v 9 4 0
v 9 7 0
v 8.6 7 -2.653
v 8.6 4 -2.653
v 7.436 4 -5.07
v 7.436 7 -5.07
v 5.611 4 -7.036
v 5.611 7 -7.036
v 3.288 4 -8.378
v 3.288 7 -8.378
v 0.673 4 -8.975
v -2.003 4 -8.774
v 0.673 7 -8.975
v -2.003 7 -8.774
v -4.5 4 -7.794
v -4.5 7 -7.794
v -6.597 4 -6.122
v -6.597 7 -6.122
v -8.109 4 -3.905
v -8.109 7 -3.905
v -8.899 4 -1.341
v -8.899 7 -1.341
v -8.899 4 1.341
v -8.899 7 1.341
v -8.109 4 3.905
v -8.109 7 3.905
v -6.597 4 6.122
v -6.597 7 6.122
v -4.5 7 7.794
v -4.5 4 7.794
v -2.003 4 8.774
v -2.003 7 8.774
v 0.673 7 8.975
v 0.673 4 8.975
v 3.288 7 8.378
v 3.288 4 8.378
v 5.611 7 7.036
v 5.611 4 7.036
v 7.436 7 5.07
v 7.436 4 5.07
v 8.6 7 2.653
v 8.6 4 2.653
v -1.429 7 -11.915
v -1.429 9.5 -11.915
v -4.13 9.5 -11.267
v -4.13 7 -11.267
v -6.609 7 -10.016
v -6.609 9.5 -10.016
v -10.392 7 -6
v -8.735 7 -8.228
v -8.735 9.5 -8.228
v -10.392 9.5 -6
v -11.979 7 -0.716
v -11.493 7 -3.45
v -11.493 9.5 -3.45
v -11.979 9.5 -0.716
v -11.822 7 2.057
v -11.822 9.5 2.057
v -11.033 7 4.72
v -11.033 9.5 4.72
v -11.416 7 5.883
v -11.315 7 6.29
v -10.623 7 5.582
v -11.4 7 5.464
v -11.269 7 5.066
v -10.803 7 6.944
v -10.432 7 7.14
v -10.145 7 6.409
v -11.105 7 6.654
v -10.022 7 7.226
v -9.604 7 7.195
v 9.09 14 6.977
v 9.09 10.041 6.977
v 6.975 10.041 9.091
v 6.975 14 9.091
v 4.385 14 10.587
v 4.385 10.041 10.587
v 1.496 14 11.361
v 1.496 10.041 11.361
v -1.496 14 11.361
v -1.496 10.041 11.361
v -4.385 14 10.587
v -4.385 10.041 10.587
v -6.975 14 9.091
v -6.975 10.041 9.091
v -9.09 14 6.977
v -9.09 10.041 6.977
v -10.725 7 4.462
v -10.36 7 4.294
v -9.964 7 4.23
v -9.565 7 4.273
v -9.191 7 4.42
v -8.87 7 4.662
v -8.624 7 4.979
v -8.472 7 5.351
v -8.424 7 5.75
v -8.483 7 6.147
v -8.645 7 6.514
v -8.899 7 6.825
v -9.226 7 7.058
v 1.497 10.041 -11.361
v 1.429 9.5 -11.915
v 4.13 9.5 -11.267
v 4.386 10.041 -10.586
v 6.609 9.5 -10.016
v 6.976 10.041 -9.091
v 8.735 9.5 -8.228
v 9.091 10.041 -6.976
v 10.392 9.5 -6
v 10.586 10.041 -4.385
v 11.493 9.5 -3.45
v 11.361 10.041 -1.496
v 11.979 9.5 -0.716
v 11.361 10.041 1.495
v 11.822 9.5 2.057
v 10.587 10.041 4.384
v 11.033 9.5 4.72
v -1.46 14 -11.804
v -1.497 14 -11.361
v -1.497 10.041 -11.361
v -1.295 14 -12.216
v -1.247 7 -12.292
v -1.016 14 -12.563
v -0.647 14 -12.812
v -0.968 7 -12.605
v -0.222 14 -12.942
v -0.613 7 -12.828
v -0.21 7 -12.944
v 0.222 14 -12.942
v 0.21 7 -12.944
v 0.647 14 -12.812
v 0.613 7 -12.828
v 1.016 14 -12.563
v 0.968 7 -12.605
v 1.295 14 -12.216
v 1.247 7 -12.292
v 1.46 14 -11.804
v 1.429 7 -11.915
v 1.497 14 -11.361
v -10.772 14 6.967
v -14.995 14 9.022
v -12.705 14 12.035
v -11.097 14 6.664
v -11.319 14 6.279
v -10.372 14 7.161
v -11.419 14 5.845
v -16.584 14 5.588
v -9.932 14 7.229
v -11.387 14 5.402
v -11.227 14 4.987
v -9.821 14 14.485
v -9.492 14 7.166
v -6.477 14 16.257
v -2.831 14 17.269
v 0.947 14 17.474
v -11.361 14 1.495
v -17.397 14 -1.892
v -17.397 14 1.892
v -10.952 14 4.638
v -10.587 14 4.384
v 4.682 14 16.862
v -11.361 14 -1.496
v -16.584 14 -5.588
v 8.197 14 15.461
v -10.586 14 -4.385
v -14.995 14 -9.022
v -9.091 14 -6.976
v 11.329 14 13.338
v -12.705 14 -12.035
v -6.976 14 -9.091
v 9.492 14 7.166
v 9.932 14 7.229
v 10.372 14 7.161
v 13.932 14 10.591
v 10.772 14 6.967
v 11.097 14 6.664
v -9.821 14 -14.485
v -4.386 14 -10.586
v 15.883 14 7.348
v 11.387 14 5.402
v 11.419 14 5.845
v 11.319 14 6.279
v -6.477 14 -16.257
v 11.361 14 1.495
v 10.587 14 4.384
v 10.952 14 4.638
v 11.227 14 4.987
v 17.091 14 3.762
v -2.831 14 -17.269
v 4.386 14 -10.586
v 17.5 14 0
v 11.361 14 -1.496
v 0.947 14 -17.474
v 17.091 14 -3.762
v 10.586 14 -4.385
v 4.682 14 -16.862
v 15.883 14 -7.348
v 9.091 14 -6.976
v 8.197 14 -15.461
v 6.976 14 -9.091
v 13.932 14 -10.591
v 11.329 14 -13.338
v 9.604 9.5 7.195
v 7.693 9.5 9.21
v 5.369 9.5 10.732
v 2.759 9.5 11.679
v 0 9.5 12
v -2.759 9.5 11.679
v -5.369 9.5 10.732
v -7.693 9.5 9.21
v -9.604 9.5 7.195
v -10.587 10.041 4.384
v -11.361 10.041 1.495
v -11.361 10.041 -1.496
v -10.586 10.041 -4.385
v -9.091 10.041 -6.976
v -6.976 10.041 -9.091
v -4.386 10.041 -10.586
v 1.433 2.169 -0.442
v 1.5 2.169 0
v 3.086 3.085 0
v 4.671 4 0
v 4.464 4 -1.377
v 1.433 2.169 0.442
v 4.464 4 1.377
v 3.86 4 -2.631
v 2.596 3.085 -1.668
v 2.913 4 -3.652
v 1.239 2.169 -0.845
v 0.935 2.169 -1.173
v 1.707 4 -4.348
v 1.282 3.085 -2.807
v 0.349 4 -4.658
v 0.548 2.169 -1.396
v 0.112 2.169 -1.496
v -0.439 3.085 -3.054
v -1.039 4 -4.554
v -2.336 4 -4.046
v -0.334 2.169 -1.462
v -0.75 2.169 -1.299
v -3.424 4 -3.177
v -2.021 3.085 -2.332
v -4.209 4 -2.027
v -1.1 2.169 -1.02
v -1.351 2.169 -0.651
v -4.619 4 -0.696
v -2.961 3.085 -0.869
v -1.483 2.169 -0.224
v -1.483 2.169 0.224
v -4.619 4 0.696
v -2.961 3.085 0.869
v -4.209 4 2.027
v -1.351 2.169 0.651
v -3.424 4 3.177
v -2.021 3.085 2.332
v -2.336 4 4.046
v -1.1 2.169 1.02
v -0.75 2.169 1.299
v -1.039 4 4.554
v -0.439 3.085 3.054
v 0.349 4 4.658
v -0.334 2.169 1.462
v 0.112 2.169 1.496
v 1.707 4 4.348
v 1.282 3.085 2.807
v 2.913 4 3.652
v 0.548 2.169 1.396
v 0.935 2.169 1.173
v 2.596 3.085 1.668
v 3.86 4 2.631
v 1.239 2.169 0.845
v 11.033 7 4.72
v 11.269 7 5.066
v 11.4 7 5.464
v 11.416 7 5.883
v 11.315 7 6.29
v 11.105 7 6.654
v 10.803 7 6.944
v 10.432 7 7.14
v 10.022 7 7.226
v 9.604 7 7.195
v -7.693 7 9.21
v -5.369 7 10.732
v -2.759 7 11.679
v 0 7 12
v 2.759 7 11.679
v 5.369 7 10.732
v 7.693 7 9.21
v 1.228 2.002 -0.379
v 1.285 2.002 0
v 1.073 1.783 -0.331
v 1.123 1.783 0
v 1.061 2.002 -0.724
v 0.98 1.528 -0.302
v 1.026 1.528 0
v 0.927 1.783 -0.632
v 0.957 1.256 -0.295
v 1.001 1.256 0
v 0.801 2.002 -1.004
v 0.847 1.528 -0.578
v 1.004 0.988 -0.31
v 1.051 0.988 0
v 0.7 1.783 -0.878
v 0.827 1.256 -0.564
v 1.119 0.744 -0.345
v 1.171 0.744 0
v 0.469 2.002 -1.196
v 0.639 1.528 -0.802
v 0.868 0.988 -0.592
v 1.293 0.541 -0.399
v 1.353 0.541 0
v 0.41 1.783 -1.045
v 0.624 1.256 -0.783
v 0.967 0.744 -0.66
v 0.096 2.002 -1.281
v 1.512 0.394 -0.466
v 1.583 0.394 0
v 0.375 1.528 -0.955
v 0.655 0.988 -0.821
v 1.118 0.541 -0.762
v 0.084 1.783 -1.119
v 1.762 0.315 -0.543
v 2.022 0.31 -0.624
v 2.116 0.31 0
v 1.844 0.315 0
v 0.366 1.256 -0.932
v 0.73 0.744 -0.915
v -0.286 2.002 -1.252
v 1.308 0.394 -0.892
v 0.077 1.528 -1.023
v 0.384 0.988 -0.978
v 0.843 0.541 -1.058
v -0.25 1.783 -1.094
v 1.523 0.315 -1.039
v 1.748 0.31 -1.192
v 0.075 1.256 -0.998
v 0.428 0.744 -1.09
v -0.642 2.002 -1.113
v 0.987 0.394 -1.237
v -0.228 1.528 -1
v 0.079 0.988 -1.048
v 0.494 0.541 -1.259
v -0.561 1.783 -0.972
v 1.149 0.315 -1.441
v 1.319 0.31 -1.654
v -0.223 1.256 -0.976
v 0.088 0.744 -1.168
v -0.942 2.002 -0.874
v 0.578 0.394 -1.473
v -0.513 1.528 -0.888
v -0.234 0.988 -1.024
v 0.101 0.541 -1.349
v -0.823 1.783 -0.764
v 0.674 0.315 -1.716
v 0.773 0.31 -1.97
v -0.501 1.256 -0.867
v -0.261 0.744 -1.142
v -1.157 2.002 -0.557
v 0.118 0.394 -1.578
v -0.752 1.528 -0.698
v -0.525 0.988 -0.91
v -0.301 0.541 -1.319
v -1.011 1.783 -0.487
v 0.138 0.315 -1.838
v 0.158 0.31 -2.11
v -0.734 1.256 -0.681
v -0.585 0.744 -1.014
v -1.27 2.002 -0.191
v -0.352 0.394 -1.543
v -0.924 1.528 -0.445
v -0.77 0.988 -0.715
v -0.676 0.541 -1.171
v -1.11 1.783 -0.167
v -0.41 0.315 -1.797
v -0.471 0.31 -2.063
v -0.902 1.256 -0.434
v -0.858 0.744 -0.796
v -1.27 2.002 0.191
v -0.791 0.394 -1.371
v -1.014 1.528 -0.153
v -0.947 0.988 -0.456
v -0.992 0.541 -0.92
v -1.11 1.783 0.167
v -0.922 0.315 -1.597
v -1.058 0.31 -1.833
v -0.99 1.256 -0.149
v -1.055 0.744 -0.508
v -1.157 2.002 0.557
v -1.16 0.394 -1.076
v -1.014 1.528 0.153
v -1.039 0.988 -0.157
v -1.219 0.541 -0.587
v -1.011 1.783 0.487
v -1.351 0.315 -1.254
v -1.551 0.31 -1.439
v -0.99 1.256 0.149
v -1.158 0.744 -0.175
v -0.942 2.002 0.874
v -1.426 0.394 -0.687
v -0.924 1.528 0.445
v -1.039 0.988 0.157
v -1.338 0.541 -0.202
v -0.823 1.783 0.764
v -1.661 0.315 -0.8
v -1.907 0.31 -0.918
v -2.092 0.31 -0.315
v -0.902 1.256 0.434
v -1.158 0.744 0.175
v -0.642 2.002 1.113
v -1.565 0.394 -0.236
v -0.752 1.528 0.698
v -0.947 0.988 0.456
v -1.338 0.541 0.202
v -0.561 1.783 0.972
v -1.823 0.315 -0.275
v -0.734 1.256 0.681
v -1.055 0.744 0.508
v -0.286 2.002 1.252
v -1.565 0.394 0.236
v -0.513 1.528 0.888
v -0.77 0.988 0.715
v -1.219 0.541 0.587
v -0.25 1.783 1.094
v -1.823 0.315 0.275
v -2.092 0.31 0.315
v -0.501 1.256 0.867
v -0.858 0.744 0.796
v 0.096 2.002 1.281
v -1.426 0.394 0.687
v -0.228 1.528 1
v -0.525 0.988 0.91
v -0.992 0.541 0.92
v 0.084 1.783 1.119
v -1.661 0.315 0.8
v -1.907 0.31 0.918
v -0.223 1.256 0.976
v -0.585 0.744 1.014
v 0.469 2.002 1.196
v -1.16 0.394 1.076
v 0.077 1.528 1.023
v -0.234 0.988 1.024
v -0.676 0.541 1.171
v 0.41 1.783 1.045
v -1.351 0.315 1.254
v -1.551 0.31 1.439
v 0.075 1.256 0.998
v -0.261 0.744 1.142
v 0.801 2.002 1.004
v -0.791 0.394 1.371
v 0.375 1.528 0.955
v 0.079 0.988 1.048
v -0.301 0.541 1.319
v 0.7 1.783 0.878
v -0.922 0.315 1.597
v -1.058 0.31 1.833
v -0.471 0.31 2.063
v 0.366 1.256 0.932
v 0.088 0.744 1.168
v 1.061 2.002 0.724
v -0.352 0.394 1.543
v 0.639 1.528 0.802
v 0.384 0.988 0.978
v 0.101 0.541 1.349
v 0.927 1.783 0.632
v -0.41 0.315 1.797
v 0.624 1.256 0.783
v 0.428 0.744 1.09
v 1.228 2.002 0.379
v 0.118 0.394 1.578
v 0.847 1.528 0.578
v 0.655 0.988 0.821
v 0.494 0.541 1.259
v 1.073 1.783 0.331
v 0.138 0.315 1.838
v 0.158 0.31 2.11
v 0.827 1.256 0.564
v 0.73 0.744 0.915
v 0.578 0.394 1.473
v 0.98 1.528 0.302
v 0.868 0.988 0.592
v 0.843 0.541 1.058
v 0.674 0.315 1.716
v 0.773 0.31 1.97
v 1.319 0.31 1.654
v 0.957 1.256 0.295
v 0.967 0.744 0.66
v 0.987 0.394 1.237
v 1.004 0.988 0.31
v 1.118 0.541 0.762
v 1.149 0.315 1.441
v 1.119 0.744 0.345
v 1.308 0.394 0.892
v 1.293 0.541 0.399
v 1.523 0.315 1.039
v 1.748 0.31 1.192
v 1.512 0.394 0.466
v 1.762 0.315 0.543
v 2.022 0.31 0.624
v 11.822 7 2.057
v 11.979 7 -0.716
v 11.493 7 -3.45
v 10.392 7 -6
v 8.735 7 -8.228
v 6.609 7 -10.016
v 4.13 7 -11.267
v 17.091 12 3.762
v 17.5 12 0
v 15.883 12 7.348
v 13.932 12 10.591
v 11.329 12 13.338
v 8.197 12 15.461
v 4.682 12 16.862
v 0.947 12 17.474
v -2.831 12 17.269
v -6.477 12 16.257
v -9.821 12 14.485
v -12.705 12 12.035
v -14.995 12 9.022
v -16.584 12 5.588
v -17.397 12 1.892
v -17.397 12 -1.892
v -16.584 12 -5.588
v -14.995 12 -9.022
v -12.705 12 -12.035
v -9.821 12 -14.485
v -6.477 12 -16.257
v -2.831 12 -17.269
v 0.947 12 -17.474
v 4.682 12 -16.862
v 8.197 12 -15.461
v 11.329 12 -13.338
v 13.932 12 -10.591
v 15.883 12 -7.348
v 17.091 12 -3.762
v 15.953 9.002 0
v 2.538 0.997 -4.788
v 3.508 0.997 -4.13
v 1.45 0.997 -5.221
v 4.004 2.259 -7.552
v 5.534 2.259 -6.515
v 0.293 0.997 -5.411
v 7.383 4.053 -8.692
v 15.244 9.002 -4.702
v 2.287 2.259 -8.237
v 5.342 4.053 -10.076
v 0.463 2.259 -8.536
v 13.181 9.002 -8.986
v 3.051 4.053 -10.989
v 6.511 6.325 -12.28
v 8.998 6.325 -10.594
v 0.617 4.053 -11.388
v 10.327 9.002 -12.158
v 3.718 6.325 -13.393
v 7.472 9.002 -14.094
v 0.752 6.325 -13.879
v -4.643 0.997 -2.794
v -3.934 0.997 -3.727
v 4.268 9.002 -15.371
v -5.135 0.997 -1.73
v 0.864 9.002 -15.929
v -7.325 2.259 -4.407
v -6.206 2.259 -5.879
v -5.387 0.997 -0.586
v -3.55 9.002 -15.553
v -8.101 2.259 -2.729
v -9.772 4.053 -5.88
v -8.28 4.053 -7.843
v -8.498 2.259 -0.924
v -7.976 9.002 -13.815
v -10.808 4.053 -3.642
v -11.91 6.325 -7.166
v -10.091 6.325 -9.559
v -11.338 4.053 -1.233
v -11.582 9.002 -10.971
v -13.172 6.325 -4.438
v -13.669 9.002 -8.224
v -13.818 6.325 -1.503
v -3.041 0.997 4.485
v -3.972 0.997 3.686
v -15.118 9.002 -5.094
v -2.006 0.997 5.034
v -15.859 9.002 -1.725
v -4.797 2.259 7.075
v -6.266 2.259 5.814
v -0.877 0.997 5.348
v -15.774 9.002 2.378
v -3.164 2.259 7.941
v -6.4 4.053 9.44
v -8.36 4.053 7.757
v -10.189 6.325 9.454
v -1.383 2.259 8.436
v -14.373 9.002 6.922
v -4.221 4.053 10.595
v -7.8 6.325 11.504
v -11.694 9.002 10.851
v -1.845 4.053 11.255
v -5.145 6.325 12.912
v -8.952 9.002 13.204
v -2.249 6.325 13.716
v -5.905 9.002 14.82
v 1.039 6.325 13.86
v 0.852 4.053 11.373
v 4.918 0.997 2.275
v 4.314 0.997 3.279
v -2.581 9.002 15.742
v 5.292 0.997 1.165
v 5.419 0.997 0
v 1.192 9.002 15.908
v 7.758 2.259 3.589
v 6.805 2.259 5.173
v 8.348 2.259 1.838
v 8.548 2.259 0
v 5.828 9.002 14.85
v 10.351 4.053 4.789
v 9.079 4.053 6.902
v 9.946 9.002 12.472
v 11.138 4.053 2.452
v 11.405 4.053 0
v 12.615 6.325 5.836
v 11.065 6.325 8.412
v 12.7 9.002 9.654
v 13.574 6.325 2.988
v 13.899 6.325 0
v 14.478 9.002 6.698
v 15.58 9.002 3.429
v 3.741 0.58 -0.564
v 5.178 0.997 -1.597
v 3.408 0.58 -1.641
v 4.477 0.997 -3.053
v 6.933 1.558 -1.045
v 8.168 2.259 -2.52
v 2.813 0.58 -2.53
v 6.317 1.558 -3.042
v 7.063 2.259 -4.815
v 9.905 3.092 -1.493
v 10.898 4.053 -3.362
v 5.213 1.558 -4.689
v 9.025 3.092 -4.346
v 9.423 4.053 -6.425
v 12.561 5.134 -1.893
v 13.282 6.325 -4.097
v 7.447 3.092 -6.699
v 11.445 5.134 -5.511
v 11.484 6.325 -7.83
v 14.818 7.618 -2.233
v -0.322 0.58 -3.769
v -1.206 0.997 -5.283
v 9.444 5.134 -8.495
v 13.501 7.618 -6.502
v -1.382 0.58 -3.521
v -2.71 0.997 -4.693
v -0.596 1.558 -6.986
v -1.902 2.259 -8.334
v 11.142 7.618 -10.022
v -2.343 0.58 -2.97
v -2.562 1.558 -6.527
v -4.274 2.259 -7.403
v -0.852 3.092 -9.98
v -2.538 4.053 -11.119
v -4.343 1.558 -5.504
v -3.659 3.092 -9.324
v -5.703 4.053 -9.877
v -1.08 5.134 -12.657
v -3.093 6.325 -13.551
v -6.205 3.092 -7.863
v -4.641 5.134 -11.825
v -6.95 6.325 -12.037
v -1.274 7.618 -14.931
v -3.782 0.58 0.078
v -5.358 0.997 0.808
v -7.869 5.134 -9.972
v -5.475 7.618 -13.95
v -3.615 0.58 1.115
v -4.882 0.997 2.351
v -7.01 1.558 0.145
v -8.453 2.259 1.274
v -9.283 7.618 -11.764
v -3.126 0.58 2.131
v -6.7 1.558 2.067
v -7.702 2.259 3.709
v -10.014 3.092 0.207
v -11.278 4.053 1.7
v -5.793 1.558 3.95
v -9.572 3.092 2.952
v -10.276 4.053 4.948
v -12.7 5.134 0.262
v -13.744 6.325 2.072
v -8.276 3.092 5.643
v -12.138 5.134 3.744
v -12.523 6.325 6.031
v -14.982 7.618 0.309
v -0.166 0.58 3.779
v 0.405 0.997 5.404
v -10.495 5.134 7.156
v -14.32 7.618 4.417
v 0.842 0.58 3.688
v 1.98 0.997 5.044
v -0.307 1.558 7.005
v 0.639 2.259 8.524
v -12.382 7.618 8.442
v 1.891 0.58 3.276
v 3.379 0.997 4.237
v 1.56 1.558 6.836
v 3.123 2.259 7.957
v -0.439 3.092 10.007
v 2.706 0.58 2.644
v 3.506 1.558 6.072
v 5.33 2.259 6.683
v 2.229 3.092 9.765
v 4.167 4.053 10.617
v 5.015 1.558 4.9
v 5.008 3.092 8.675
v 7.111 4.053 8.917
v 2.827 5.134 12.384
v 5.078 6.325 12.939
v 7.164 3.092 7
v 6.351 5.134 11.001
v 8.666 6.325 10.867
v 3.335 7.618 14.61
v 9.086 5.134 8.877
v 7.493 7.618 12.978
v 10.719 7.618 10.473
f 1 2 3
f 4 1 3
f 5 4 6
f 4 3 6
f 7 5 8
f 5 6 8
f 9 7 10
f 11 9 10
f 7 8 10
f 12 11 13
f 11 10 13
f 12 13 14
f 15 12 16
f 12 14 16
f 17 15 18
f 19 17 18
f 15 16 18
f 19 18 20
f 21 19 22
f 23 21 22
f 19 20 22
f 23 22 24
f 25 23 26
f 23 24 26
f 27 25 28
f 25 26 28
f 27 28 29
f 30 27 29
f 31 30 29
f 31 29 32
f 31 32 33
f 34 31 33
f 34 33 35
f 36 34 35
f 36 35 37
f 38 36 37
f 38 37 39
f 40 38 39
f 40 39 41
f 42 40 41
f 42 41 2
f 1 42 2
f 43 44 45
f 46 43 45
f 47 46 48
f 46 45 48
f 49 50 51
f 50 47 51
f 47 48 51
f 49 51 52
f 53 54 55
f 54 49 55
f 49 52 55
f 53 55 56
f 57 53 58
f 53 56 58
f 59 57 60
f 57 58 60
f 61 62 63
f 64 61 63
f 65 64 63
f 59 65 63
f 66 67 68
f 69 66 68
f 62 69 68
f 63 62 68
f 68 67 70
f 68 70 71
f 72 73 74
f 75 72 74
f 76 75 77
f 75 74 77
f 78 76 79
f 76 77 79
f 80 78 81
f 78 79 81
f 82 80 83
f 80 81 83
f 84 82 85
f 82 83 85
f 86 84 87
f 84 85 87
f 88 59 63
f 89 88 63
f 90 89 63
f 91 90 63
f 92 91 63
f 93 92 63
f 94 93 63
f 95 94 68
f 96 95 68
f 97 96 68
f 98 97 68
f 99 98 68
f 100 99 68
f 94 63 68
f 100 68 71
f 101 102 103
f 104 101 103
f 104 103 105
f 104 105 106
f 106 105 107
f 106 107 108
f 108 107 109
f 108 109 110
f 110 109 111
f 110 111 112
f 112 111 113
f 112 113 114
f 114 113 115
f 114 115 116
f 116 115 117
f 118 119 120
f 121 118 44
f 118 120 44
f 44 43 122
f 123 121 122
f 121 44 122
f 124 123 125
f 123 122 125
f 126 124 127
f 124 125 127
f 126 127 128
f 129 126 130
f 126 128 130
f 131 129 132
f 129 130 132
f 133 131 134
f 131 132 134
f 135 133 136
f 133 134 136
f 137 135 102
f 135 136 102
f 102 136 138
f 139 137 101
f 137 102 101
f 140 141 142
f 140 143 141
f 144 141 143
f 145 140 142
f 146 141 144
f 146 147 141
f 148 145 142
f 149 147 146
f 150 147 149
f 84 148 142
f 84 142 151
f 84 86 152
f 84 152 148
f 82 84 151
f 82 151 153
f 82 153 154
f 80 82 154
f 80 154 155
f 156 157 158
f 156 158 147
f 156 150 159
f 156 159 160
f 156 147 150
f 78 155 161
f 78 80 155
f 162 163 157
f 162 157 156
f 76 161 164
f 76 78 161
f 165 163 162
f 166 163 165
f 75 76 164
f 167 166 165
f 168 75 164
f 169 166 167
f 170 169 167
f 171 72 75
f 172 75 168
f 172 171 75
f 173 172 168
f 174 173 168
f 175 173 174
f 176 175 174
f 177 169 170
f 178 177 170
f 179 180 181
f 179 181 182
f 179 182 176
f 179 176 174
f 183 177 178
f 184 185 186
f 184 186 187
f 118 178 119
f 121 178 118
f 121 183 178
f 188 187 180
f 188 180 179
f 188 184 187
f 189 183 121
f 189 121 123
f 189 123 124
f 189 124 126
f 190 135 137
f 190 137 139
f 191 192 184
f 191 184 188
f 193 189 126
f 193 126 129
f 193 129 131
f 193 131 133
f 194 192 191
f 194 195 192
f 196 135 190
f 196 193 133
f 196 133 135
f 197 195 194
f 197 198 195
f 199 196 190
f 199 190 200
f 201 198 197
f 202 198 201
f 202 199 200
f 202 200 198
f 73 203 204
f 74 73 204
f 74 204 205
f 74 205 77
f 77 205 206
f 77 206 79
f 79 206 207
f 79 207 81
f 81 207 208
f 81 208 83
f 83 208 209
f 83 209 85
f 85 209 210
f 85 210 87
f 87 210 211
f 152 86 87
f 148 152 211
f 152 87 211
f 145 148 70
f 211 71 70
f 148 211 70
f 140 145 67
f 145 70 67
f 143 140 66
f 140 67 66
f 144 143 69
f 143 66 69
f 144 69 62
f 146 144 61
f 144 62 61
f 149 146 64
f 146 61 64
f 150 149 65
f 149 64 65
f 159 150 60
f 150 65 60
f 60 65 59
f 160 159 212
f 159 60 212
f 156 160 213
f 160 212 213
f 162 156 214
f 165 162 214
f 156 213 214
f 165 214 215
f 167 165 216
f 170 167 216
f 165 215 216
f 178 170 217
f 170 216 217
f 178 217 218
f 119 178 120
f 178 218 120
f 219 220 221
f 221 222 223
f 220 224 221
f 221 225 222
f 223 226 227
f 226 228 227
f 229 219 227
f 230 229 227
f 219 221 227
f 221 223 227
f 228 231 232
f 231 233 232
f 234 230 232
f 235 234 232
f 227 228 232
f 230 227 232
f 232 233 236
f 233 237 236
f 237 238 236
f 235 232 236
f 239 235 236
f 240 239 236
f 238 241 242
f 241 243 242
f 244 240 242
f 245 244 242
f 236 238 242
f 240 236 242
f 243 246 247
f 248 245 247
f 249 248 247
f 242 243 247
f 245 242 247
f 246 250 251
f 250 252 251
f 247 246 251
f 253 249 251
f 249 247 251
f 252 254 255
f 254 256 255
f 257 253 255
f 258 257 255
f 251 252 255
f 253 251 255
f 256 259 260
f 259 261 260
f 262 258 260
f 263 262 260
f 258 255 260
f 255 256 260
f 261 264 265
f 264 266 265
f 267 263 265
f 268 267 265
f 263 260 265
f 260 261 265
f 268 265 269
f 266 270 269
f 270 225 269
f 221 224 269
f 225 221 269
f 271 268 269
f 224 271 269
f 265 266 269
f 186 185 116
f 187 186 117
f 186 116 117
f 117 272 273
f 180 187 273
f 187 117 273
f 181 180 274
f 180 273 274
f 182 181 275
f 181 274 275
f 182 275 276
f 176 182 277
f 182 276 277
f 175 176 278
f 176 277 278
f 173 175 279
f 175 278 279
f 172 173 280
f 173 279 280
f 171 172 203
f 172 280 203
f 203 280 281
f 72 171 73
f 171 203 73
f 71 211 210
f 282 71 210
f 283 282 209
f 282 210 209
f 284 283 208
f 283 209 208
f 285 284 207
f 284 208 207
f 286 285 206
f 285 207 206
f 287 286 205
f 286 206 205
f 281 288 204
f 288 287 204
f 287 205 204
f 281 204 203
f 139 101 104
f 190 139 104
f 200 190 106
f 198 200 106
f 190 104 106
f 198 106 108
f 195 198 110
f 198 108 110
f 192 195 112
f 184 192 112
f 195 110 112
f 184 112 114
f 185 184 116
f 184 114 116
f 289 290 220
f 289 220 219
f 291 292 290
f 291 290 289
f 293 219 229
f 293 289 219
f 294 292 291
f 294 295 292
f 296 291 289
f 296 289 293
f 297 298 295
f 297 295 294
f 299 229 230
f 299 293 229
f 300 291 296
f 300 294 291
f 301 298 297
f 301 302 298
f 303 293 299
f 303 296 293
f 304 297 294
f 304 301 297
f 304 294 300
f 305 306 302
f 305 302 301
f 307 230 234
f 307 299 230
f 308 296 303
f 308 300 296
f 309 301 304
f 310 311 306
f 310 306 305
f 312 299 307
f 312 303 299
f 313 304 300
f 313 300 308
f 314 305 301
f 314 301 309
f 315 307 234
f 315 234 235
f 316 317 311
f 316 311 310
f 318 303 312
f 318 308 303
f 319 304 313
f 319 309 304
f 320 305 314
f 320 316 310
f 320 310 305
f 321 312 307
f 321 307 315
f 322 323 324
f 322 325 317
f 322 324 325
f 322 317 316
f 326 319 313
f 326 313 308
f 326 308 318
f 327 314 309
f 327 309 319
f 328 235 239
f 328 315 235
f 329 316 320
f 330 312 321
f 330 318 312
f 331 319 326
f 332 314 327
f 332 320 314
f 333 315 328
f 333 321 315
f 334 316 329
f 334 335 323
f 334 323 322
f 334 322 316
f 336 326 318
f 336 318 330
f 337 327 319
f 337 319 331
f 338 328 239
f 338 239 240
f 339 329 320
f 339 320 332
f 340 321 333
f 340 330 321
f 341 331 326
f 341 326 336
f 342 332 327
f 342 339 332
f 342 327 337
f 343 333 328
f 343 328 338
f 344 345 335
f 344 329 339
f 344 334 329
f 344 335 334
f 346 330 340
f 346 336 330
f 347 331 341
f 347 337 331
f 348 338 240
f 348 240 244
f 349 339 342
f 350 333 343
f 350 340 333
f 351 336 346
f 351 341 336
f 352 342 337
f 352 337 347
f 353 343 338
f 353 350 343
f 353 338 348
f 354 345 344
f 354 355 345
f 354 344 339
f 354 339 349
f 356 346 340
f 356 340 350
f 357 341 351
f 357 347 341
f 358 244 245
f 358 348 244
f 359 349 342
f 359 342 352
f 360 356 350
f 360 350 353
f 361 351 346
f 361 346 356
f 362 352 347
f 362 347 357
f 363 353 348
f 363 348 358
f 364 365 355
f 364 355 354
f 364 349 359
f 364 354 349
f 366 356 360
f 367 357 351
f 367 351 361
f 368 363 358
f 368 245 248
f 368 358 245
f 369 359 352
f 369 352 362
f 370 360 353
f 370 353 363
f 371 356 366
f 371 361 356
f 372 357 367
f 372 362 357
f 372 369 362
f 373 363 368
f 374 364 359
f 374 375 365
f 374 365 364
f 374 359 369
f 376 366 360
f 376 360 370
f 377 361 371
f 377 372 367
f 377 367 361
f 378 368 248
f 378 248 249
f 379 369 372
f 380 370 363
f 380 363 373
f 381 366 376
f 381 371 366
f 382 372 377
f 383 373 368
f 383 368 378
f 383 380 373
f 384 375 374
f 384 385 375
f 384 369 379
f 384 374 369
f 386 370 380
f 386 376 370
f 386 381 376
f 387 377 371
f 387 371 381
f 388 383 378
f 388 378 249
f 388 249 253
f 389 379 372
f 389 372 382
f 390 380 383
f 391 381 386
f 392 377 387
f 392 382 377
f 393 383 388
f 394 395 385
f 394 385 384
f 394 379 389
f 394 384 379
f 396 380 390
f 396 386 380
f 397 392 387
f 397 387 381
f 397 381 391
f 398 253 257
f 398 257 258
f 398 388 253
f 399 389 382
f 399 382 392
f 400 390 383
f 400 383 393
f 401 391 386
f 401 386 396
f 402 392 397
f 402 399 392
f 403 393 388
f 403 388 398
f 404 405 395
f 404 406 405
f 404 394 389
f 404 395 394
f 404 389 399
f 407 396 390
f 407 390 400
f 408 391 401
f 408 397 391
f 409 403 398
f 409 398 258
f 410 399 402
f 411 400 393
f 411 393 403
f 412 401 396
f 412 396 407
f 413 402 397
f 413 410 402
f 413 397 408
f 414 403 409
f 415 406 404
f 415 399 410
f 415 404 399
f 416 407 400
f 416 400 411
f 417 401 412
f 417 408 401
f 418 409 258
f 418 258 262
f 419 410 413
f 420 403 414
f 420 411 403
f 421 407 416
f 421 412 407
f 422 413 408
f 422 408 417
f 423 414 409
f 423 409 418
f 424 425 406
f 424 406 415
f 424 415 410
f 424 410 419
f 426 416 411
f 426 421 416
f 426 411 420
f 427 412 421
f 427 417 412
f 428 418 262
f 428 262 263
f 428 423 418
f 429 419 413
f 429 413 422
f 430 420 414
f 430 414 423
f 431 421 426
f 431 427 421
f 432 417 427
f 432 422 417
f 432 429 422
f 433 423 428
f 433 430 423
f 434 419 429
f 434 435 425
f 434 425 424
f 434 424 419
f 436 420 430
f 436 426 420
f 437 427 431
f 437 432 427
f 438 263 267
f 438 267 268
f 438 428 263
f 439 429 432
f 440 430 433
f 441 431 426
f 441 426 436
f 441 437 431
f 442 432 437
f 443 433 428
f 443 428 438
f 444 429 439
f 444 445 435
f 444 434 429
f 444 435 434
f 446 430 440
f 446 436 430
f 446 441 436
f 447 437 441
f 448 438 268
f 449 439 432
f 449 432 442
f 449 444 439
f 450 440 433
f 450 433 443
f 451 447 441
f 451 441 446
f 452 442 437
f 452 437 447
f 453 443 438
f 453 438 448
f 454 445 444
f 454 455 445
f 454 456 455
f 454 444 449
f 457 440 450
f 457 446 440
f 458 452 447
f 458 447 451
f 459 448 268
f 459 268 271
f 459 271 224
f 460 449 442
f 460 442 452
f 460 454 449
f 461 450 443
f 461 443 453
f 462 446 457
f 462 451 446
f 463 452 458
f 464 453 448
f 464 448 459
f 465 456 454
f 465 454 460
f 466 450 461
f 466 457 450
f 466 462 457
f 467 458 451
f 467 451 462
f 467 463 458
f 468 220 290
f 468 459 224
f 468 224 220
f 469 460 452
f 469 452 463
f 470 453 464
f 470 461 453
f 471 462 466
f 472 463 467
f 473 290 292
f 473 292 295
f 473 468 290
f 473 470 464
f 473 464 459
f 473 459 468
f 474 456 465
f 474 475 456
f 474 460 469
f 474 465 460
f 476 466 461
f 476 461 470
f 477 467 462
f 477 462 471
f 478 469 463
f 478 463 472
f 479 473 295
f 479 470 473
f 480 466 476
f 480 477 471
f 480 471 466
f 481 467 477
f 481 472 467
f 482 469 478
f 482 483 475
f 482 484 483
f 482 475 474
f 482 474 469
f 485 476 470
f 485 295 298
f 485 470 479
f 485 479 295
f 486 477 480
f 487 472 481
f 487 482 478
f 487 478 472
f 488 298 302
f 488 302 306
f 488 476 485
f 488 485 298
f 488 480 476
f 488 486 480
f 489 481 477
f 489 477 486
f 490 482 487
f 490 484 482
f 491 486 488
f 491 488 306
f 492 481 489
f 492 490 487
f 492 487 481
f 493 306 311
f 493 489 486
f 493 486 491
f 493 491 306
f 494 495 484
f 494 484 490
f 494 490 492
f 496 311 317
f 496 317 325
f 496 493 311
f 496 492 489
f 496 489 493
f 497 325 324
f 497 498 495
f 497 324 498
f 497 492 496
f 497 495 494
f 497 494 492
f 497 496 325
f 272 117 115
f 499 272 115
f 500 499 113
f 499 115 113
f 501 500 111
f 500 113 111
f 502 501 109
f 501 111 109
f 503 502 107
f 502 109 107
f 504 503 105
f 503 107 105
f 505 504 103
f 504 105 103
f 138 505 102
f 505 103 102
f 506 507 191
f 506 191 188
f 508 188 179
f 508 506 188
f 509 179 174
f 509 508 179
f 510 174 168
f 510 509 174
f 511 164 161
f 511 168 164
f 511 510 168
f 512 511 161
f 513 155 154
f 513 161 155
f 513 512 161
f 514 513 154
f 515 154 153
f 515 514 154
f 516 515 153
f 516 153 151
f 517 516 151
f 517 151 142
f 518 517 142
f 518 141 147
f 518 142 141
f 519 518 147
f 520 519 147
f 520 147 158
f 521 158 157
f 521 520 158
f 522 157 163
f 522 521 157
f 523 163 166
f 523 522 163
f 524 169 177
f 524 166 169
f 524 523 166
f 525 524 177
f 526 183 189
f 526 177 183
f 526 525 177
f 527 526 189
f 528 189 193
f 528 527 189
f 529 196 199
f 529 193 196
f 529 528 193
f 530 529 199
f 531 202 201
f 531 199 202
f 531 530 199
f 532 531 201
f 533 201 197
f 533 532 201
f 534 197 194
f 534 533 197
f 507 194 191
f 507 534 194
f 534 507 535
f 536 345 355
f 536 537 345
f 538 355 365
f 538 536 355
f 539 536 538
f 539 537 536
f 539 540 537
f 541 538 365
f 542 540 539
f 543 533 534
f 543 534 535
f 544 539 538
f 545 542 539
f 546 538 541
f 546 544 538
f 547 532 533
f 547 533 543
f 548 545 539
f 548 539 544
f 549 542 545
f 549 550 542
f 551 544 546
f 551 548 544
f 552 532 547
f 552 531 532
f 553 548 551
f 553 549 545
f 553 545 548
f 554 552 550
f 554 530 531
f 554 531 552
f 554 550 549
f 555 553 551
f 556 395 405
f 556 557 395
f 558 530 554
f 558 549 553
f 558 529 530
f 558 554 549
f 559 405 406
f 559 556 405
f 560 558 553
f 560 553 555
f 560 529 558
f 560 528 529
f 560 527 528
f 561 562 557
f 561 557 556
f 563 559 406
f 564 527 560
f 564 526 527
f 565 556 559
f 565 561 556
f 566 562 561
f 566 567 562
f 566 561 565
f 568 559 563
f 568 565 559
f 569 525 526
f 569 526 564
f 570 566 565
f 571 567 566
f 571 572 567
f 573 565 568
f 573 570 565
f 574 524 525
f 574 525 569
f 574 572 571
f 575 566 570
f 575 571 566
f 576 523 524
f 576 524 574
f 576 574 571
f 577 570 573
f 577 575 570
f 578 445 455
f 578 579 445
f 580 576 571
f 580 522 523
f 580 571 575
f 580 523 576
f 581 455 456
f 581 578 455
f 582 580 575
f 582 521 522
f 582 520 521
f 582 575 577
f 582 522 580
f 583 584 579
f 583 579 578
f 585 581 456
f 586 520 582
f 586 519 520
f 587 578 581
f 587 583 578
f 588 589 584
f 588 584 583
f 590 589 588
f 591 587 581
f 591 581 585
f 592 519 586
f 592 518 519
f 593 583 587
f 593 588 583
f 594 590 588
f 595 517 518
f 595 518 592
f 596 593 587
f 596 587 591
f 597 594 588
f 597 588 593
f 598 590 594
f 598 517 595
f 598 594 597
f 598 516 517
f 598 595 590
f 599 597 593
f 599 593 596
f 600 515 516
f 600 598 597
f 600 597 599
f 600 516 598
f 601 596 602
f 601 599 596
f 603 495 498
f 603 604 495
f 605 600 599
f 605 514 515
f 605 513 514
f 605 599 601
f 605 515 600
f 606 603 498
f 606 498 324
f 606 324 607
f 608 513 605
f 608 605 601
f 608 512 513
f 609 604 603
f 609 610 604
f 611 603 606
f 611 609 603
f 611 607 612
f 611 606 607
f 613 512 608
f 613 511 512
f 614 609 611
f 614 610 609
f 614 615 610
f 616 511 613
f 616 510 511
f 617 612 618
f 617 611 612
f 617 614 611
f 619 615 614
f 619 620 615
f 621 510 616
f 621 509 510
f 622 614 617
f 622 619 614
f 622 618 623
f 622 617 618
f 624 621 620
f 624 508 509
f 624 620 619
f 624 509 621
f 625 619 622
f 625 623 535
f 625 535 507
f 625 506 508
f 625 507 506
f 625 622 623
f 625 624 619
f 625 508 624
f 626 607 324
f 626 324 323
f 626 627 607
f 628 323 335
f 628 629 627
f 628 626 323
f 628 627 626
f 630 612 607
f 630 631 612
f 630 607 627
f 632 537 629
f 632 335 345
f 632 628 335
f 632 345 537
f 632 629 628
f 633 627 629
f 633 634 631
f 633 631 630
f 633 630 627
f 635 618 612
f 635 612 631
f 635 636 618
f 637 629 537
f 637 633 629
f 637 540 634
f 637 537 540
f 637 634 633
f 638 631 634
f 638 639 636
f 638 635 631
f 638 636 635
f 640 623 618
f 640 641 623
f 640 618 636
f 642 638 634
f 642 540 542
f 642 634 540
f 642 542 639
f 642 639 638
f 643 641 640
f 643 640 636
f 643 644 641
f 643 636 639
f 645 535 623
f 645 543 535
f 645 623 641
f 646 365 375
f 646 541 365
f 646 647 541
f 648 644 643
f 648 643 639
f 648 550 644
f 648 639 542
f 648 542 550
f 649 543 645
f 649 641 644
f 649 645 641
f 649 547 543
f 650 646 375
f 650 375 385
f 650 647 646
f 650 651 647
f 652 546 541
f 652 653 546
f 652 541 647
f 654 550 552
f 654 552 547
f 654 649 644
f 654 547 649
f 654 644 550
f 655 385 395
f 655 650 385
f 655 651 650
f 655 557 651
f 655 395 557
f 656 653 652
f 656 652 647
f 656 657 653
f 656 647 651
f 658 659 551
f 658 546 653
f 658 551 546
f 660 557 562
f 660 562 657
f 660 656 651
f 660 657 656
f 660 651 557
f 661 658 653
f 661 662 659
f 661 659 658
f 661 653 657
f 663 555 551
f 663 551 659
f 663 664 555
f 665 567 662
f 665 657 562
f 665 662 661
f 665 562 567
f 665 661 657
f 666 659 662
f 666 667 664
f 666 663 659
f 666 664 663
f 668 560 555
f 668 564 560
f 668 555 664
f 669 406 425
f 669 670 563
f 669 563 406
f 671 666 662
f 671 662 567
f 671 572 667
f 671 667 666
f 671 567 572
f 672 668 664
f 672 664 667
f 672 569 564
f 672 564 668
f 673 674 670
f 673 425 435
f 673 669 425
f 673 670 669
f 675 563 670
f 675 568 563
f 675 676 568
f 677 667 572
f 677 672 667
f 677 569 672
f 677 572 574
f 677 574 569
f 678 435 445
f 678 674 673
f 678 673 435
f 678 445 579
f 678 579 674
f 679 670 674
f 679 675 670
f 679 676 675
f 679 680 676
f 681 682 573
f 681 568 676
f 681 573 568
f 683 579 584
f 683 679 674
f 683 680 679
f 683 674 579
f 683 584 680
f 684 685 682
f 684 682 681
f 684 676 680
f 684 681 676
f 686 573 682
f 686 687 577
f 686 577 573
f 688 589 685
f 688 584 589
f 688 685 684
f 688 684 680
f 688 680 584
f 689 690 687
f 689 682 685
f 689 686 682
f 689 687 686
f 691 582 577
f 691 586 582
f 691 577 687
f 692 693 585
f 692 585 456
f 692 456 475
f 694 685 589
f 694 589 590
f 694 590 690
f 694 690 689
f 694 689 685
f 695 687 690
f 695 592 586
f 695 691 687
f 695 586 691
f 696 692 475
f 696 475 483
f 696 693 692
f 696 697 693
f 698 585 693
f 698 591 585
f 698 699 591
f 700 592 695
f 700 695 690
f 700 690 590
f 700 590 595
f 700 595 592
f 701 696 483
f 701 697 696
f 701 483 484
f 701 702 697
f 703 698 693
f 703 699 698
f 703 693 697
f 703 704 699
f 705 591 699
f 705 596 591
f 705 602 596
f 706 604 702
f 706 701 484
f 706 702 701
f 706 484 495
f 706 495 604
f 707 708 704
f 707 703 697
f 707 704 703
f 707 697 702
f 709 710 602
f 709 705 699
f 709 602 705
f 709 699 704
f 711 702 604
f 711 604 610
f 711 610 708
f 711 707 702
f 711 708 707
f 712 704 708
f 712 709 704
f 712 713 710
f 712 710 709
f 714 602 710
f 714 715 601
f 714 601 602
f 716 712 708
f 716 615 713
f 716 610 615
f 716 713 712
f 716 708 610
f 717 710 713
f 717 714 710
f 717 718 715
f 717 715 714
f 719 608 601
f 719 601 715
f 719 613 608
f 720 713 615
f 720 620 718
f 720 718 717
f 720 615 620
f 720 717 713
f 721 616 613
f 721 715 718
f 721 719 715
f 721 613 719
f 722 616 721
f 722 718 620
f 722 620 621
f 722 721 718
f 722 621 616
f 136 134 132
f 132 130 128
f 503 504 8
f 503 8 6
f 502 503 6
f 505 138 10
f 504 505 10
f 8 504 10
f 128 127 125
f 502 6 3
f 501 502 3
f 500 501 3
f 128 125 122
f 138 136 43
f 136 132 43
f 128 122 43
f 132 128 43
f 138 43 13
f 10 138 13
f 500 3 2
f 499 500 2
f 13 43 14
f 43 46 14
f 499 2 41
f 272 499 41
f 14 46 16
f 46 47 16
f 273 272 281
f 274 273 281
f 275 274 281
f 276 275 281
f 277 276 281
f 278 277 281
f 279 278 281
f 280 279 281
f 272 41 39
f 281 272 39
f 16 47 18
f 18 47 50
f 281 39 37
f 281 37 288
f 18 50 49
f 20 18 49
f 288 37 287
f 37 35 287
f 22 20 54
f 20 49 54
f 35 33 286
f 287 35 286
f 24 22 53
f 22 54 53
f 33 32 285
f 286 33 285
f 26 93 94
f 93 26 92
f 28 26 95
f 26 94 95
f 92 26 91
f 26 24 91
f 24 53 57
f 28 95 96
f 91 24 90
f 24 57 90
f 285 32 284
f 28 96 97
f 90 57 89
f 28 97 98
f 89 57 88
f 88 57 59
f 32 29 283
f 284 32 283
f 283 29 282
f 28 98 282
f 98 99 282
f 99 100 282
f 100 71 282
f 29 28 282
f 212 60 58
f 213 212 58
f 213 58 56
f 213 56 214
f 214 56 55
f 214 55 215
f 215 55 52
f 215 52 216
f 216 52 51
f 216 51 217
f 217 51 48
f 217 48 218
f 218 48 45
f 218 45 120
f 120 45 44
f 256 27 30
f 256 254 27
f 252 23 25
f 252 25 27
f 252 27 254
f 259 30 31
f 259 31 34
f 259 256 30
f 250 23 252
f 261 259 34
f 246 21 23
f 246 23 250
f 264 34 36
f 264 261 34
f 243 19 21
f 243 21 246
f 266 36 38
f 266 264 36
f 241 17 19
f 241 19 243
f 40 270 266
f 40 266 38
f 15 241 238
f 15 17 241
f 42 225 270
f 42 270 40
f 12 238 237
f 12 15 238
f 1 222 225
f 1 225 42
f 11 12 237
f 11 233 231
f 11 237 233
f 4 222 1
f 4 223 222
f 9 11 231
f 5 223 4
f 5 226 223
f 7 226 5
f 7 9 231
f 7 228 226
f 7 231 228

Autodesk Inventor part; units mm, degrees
ref_plane "YZ Plane" through (0, 0, 0) normal (1, 0, 0) x (0, 1, 0)
ref_plane "XZ Plane" through (0, 0, 0) normal (0, 1, 0) x (-1, 0, 0)
ref_plane "XY Plane" through (0, 0, 0) normal (0, 0, 1) x (1, 0, 0)
sketch "Sketch1" plane through (0, 0, 0) normal (0, 0, 1) x (1, 0, 0)
  line L0 (-35.8694, 36.1667) -> (26.1213, 35.095) construction
  line L1 (26.1213, 35.095) -> (24.9917, -30.2436) construction
  line L2 (24.9917, -30.2436) -> (-36.999, -29.1719) construction
  line L3 (-36.999, -29.1719) -> (-35.8694, 36.1667) construction
  line L4 (0, -29.8115) -> (0, 35.5466) construction
  line L5 (-17.5, 14) -> (17.5, 14)
  line L6 (17.5, 14) -> (17.5, 12)
  arc A0 (0, 0.1813) -> (17.5, 12) centre (-0.0907, 19.1811) ccw
  arc A1 (1.5, 2.169) -> (2.1161, 0.3097) centre (2, 1.3029) ccw
  line L7 (12, 7) -> (12, 9.5)
  line L8 (12, 9.5) -> (11, 10.5)
  line L9 (11, 10.5) -> (11, 14)
  line L10 (4.6714, 4) -> (9, 4)
  line L11 (9, 4) -> (9, 7)
  line L12 (9, 7) -> (12, 7)
  line L13 (1.5, 2.169) -> (4.6714, 4)
  line L14 (1.5, 2.169) -> (0, 1.3029)
  point P0 (0, 0)
  point P1 (0, 14)
  point P2 (0, 0)
  dimension "d3" = 26.1213
  dimension "d7" = 24.9955
  dimension "d9" = 35
  dimension "d10" = 62
  dimension "d18" = 21.5466
  dimension "d19" = 14
  dimension "d26" = 19
  dimension "d27" = 1
  dimension "d34" = 22
  dimension "d38" = 135
  dimension "d39" = 2
  dimension "d41" = 2
  dimension "d44" = 24
  dimension "d54" = 11.831
  dimension "d82" = 18
  dimension "d83" = 10
  dimension "d86" = 7
  dimension "d87" = 3.5
  dimension "d90" = 150
revolve "Revolution1" add sketch "Sketch1" angle 360 about axis through (0, -29.8115, 0) along (0, 1, 0)
sketch "Sketch2" plane through (0, 14, 0) normal (0, 1, 0) x (1, 0, 0)
  circle A0 centre (0, 0) radius 11 projected
  point P0 (0, 0)
hole "Hole1" at (0, 14, 0) direction (0, -1, 0) diameter 22.9175 depth 5 thread size "M24x1" class "6H" standard "ISO Metric profile"
sketch "Sketch3" plane through (0, 14, 0) normal (0, 1, 0) x (1, 0, 0)
  circle A0 centre (0, 0) radius 11.4587 projected
  point P0 (0, 0)
  point P1 (0, 11.4587)
hole "Hole2" at (0, 14, -11.4587) direction (0, -1, 0) diameter 3 depth 7
pattern_circular "Circular Pattern1" count 3 over 360 about axis through (0, 13, 0) along (0, -1, 0) of "Hole2"
equation "\"d3\" = 0.421311 * d10"
equation "\"d7\" = 0.403153 * d10"
equation "\"d18\" = 0.347525 * d10"
properties part number "015" material "Stainless Steel, Austenitic"
